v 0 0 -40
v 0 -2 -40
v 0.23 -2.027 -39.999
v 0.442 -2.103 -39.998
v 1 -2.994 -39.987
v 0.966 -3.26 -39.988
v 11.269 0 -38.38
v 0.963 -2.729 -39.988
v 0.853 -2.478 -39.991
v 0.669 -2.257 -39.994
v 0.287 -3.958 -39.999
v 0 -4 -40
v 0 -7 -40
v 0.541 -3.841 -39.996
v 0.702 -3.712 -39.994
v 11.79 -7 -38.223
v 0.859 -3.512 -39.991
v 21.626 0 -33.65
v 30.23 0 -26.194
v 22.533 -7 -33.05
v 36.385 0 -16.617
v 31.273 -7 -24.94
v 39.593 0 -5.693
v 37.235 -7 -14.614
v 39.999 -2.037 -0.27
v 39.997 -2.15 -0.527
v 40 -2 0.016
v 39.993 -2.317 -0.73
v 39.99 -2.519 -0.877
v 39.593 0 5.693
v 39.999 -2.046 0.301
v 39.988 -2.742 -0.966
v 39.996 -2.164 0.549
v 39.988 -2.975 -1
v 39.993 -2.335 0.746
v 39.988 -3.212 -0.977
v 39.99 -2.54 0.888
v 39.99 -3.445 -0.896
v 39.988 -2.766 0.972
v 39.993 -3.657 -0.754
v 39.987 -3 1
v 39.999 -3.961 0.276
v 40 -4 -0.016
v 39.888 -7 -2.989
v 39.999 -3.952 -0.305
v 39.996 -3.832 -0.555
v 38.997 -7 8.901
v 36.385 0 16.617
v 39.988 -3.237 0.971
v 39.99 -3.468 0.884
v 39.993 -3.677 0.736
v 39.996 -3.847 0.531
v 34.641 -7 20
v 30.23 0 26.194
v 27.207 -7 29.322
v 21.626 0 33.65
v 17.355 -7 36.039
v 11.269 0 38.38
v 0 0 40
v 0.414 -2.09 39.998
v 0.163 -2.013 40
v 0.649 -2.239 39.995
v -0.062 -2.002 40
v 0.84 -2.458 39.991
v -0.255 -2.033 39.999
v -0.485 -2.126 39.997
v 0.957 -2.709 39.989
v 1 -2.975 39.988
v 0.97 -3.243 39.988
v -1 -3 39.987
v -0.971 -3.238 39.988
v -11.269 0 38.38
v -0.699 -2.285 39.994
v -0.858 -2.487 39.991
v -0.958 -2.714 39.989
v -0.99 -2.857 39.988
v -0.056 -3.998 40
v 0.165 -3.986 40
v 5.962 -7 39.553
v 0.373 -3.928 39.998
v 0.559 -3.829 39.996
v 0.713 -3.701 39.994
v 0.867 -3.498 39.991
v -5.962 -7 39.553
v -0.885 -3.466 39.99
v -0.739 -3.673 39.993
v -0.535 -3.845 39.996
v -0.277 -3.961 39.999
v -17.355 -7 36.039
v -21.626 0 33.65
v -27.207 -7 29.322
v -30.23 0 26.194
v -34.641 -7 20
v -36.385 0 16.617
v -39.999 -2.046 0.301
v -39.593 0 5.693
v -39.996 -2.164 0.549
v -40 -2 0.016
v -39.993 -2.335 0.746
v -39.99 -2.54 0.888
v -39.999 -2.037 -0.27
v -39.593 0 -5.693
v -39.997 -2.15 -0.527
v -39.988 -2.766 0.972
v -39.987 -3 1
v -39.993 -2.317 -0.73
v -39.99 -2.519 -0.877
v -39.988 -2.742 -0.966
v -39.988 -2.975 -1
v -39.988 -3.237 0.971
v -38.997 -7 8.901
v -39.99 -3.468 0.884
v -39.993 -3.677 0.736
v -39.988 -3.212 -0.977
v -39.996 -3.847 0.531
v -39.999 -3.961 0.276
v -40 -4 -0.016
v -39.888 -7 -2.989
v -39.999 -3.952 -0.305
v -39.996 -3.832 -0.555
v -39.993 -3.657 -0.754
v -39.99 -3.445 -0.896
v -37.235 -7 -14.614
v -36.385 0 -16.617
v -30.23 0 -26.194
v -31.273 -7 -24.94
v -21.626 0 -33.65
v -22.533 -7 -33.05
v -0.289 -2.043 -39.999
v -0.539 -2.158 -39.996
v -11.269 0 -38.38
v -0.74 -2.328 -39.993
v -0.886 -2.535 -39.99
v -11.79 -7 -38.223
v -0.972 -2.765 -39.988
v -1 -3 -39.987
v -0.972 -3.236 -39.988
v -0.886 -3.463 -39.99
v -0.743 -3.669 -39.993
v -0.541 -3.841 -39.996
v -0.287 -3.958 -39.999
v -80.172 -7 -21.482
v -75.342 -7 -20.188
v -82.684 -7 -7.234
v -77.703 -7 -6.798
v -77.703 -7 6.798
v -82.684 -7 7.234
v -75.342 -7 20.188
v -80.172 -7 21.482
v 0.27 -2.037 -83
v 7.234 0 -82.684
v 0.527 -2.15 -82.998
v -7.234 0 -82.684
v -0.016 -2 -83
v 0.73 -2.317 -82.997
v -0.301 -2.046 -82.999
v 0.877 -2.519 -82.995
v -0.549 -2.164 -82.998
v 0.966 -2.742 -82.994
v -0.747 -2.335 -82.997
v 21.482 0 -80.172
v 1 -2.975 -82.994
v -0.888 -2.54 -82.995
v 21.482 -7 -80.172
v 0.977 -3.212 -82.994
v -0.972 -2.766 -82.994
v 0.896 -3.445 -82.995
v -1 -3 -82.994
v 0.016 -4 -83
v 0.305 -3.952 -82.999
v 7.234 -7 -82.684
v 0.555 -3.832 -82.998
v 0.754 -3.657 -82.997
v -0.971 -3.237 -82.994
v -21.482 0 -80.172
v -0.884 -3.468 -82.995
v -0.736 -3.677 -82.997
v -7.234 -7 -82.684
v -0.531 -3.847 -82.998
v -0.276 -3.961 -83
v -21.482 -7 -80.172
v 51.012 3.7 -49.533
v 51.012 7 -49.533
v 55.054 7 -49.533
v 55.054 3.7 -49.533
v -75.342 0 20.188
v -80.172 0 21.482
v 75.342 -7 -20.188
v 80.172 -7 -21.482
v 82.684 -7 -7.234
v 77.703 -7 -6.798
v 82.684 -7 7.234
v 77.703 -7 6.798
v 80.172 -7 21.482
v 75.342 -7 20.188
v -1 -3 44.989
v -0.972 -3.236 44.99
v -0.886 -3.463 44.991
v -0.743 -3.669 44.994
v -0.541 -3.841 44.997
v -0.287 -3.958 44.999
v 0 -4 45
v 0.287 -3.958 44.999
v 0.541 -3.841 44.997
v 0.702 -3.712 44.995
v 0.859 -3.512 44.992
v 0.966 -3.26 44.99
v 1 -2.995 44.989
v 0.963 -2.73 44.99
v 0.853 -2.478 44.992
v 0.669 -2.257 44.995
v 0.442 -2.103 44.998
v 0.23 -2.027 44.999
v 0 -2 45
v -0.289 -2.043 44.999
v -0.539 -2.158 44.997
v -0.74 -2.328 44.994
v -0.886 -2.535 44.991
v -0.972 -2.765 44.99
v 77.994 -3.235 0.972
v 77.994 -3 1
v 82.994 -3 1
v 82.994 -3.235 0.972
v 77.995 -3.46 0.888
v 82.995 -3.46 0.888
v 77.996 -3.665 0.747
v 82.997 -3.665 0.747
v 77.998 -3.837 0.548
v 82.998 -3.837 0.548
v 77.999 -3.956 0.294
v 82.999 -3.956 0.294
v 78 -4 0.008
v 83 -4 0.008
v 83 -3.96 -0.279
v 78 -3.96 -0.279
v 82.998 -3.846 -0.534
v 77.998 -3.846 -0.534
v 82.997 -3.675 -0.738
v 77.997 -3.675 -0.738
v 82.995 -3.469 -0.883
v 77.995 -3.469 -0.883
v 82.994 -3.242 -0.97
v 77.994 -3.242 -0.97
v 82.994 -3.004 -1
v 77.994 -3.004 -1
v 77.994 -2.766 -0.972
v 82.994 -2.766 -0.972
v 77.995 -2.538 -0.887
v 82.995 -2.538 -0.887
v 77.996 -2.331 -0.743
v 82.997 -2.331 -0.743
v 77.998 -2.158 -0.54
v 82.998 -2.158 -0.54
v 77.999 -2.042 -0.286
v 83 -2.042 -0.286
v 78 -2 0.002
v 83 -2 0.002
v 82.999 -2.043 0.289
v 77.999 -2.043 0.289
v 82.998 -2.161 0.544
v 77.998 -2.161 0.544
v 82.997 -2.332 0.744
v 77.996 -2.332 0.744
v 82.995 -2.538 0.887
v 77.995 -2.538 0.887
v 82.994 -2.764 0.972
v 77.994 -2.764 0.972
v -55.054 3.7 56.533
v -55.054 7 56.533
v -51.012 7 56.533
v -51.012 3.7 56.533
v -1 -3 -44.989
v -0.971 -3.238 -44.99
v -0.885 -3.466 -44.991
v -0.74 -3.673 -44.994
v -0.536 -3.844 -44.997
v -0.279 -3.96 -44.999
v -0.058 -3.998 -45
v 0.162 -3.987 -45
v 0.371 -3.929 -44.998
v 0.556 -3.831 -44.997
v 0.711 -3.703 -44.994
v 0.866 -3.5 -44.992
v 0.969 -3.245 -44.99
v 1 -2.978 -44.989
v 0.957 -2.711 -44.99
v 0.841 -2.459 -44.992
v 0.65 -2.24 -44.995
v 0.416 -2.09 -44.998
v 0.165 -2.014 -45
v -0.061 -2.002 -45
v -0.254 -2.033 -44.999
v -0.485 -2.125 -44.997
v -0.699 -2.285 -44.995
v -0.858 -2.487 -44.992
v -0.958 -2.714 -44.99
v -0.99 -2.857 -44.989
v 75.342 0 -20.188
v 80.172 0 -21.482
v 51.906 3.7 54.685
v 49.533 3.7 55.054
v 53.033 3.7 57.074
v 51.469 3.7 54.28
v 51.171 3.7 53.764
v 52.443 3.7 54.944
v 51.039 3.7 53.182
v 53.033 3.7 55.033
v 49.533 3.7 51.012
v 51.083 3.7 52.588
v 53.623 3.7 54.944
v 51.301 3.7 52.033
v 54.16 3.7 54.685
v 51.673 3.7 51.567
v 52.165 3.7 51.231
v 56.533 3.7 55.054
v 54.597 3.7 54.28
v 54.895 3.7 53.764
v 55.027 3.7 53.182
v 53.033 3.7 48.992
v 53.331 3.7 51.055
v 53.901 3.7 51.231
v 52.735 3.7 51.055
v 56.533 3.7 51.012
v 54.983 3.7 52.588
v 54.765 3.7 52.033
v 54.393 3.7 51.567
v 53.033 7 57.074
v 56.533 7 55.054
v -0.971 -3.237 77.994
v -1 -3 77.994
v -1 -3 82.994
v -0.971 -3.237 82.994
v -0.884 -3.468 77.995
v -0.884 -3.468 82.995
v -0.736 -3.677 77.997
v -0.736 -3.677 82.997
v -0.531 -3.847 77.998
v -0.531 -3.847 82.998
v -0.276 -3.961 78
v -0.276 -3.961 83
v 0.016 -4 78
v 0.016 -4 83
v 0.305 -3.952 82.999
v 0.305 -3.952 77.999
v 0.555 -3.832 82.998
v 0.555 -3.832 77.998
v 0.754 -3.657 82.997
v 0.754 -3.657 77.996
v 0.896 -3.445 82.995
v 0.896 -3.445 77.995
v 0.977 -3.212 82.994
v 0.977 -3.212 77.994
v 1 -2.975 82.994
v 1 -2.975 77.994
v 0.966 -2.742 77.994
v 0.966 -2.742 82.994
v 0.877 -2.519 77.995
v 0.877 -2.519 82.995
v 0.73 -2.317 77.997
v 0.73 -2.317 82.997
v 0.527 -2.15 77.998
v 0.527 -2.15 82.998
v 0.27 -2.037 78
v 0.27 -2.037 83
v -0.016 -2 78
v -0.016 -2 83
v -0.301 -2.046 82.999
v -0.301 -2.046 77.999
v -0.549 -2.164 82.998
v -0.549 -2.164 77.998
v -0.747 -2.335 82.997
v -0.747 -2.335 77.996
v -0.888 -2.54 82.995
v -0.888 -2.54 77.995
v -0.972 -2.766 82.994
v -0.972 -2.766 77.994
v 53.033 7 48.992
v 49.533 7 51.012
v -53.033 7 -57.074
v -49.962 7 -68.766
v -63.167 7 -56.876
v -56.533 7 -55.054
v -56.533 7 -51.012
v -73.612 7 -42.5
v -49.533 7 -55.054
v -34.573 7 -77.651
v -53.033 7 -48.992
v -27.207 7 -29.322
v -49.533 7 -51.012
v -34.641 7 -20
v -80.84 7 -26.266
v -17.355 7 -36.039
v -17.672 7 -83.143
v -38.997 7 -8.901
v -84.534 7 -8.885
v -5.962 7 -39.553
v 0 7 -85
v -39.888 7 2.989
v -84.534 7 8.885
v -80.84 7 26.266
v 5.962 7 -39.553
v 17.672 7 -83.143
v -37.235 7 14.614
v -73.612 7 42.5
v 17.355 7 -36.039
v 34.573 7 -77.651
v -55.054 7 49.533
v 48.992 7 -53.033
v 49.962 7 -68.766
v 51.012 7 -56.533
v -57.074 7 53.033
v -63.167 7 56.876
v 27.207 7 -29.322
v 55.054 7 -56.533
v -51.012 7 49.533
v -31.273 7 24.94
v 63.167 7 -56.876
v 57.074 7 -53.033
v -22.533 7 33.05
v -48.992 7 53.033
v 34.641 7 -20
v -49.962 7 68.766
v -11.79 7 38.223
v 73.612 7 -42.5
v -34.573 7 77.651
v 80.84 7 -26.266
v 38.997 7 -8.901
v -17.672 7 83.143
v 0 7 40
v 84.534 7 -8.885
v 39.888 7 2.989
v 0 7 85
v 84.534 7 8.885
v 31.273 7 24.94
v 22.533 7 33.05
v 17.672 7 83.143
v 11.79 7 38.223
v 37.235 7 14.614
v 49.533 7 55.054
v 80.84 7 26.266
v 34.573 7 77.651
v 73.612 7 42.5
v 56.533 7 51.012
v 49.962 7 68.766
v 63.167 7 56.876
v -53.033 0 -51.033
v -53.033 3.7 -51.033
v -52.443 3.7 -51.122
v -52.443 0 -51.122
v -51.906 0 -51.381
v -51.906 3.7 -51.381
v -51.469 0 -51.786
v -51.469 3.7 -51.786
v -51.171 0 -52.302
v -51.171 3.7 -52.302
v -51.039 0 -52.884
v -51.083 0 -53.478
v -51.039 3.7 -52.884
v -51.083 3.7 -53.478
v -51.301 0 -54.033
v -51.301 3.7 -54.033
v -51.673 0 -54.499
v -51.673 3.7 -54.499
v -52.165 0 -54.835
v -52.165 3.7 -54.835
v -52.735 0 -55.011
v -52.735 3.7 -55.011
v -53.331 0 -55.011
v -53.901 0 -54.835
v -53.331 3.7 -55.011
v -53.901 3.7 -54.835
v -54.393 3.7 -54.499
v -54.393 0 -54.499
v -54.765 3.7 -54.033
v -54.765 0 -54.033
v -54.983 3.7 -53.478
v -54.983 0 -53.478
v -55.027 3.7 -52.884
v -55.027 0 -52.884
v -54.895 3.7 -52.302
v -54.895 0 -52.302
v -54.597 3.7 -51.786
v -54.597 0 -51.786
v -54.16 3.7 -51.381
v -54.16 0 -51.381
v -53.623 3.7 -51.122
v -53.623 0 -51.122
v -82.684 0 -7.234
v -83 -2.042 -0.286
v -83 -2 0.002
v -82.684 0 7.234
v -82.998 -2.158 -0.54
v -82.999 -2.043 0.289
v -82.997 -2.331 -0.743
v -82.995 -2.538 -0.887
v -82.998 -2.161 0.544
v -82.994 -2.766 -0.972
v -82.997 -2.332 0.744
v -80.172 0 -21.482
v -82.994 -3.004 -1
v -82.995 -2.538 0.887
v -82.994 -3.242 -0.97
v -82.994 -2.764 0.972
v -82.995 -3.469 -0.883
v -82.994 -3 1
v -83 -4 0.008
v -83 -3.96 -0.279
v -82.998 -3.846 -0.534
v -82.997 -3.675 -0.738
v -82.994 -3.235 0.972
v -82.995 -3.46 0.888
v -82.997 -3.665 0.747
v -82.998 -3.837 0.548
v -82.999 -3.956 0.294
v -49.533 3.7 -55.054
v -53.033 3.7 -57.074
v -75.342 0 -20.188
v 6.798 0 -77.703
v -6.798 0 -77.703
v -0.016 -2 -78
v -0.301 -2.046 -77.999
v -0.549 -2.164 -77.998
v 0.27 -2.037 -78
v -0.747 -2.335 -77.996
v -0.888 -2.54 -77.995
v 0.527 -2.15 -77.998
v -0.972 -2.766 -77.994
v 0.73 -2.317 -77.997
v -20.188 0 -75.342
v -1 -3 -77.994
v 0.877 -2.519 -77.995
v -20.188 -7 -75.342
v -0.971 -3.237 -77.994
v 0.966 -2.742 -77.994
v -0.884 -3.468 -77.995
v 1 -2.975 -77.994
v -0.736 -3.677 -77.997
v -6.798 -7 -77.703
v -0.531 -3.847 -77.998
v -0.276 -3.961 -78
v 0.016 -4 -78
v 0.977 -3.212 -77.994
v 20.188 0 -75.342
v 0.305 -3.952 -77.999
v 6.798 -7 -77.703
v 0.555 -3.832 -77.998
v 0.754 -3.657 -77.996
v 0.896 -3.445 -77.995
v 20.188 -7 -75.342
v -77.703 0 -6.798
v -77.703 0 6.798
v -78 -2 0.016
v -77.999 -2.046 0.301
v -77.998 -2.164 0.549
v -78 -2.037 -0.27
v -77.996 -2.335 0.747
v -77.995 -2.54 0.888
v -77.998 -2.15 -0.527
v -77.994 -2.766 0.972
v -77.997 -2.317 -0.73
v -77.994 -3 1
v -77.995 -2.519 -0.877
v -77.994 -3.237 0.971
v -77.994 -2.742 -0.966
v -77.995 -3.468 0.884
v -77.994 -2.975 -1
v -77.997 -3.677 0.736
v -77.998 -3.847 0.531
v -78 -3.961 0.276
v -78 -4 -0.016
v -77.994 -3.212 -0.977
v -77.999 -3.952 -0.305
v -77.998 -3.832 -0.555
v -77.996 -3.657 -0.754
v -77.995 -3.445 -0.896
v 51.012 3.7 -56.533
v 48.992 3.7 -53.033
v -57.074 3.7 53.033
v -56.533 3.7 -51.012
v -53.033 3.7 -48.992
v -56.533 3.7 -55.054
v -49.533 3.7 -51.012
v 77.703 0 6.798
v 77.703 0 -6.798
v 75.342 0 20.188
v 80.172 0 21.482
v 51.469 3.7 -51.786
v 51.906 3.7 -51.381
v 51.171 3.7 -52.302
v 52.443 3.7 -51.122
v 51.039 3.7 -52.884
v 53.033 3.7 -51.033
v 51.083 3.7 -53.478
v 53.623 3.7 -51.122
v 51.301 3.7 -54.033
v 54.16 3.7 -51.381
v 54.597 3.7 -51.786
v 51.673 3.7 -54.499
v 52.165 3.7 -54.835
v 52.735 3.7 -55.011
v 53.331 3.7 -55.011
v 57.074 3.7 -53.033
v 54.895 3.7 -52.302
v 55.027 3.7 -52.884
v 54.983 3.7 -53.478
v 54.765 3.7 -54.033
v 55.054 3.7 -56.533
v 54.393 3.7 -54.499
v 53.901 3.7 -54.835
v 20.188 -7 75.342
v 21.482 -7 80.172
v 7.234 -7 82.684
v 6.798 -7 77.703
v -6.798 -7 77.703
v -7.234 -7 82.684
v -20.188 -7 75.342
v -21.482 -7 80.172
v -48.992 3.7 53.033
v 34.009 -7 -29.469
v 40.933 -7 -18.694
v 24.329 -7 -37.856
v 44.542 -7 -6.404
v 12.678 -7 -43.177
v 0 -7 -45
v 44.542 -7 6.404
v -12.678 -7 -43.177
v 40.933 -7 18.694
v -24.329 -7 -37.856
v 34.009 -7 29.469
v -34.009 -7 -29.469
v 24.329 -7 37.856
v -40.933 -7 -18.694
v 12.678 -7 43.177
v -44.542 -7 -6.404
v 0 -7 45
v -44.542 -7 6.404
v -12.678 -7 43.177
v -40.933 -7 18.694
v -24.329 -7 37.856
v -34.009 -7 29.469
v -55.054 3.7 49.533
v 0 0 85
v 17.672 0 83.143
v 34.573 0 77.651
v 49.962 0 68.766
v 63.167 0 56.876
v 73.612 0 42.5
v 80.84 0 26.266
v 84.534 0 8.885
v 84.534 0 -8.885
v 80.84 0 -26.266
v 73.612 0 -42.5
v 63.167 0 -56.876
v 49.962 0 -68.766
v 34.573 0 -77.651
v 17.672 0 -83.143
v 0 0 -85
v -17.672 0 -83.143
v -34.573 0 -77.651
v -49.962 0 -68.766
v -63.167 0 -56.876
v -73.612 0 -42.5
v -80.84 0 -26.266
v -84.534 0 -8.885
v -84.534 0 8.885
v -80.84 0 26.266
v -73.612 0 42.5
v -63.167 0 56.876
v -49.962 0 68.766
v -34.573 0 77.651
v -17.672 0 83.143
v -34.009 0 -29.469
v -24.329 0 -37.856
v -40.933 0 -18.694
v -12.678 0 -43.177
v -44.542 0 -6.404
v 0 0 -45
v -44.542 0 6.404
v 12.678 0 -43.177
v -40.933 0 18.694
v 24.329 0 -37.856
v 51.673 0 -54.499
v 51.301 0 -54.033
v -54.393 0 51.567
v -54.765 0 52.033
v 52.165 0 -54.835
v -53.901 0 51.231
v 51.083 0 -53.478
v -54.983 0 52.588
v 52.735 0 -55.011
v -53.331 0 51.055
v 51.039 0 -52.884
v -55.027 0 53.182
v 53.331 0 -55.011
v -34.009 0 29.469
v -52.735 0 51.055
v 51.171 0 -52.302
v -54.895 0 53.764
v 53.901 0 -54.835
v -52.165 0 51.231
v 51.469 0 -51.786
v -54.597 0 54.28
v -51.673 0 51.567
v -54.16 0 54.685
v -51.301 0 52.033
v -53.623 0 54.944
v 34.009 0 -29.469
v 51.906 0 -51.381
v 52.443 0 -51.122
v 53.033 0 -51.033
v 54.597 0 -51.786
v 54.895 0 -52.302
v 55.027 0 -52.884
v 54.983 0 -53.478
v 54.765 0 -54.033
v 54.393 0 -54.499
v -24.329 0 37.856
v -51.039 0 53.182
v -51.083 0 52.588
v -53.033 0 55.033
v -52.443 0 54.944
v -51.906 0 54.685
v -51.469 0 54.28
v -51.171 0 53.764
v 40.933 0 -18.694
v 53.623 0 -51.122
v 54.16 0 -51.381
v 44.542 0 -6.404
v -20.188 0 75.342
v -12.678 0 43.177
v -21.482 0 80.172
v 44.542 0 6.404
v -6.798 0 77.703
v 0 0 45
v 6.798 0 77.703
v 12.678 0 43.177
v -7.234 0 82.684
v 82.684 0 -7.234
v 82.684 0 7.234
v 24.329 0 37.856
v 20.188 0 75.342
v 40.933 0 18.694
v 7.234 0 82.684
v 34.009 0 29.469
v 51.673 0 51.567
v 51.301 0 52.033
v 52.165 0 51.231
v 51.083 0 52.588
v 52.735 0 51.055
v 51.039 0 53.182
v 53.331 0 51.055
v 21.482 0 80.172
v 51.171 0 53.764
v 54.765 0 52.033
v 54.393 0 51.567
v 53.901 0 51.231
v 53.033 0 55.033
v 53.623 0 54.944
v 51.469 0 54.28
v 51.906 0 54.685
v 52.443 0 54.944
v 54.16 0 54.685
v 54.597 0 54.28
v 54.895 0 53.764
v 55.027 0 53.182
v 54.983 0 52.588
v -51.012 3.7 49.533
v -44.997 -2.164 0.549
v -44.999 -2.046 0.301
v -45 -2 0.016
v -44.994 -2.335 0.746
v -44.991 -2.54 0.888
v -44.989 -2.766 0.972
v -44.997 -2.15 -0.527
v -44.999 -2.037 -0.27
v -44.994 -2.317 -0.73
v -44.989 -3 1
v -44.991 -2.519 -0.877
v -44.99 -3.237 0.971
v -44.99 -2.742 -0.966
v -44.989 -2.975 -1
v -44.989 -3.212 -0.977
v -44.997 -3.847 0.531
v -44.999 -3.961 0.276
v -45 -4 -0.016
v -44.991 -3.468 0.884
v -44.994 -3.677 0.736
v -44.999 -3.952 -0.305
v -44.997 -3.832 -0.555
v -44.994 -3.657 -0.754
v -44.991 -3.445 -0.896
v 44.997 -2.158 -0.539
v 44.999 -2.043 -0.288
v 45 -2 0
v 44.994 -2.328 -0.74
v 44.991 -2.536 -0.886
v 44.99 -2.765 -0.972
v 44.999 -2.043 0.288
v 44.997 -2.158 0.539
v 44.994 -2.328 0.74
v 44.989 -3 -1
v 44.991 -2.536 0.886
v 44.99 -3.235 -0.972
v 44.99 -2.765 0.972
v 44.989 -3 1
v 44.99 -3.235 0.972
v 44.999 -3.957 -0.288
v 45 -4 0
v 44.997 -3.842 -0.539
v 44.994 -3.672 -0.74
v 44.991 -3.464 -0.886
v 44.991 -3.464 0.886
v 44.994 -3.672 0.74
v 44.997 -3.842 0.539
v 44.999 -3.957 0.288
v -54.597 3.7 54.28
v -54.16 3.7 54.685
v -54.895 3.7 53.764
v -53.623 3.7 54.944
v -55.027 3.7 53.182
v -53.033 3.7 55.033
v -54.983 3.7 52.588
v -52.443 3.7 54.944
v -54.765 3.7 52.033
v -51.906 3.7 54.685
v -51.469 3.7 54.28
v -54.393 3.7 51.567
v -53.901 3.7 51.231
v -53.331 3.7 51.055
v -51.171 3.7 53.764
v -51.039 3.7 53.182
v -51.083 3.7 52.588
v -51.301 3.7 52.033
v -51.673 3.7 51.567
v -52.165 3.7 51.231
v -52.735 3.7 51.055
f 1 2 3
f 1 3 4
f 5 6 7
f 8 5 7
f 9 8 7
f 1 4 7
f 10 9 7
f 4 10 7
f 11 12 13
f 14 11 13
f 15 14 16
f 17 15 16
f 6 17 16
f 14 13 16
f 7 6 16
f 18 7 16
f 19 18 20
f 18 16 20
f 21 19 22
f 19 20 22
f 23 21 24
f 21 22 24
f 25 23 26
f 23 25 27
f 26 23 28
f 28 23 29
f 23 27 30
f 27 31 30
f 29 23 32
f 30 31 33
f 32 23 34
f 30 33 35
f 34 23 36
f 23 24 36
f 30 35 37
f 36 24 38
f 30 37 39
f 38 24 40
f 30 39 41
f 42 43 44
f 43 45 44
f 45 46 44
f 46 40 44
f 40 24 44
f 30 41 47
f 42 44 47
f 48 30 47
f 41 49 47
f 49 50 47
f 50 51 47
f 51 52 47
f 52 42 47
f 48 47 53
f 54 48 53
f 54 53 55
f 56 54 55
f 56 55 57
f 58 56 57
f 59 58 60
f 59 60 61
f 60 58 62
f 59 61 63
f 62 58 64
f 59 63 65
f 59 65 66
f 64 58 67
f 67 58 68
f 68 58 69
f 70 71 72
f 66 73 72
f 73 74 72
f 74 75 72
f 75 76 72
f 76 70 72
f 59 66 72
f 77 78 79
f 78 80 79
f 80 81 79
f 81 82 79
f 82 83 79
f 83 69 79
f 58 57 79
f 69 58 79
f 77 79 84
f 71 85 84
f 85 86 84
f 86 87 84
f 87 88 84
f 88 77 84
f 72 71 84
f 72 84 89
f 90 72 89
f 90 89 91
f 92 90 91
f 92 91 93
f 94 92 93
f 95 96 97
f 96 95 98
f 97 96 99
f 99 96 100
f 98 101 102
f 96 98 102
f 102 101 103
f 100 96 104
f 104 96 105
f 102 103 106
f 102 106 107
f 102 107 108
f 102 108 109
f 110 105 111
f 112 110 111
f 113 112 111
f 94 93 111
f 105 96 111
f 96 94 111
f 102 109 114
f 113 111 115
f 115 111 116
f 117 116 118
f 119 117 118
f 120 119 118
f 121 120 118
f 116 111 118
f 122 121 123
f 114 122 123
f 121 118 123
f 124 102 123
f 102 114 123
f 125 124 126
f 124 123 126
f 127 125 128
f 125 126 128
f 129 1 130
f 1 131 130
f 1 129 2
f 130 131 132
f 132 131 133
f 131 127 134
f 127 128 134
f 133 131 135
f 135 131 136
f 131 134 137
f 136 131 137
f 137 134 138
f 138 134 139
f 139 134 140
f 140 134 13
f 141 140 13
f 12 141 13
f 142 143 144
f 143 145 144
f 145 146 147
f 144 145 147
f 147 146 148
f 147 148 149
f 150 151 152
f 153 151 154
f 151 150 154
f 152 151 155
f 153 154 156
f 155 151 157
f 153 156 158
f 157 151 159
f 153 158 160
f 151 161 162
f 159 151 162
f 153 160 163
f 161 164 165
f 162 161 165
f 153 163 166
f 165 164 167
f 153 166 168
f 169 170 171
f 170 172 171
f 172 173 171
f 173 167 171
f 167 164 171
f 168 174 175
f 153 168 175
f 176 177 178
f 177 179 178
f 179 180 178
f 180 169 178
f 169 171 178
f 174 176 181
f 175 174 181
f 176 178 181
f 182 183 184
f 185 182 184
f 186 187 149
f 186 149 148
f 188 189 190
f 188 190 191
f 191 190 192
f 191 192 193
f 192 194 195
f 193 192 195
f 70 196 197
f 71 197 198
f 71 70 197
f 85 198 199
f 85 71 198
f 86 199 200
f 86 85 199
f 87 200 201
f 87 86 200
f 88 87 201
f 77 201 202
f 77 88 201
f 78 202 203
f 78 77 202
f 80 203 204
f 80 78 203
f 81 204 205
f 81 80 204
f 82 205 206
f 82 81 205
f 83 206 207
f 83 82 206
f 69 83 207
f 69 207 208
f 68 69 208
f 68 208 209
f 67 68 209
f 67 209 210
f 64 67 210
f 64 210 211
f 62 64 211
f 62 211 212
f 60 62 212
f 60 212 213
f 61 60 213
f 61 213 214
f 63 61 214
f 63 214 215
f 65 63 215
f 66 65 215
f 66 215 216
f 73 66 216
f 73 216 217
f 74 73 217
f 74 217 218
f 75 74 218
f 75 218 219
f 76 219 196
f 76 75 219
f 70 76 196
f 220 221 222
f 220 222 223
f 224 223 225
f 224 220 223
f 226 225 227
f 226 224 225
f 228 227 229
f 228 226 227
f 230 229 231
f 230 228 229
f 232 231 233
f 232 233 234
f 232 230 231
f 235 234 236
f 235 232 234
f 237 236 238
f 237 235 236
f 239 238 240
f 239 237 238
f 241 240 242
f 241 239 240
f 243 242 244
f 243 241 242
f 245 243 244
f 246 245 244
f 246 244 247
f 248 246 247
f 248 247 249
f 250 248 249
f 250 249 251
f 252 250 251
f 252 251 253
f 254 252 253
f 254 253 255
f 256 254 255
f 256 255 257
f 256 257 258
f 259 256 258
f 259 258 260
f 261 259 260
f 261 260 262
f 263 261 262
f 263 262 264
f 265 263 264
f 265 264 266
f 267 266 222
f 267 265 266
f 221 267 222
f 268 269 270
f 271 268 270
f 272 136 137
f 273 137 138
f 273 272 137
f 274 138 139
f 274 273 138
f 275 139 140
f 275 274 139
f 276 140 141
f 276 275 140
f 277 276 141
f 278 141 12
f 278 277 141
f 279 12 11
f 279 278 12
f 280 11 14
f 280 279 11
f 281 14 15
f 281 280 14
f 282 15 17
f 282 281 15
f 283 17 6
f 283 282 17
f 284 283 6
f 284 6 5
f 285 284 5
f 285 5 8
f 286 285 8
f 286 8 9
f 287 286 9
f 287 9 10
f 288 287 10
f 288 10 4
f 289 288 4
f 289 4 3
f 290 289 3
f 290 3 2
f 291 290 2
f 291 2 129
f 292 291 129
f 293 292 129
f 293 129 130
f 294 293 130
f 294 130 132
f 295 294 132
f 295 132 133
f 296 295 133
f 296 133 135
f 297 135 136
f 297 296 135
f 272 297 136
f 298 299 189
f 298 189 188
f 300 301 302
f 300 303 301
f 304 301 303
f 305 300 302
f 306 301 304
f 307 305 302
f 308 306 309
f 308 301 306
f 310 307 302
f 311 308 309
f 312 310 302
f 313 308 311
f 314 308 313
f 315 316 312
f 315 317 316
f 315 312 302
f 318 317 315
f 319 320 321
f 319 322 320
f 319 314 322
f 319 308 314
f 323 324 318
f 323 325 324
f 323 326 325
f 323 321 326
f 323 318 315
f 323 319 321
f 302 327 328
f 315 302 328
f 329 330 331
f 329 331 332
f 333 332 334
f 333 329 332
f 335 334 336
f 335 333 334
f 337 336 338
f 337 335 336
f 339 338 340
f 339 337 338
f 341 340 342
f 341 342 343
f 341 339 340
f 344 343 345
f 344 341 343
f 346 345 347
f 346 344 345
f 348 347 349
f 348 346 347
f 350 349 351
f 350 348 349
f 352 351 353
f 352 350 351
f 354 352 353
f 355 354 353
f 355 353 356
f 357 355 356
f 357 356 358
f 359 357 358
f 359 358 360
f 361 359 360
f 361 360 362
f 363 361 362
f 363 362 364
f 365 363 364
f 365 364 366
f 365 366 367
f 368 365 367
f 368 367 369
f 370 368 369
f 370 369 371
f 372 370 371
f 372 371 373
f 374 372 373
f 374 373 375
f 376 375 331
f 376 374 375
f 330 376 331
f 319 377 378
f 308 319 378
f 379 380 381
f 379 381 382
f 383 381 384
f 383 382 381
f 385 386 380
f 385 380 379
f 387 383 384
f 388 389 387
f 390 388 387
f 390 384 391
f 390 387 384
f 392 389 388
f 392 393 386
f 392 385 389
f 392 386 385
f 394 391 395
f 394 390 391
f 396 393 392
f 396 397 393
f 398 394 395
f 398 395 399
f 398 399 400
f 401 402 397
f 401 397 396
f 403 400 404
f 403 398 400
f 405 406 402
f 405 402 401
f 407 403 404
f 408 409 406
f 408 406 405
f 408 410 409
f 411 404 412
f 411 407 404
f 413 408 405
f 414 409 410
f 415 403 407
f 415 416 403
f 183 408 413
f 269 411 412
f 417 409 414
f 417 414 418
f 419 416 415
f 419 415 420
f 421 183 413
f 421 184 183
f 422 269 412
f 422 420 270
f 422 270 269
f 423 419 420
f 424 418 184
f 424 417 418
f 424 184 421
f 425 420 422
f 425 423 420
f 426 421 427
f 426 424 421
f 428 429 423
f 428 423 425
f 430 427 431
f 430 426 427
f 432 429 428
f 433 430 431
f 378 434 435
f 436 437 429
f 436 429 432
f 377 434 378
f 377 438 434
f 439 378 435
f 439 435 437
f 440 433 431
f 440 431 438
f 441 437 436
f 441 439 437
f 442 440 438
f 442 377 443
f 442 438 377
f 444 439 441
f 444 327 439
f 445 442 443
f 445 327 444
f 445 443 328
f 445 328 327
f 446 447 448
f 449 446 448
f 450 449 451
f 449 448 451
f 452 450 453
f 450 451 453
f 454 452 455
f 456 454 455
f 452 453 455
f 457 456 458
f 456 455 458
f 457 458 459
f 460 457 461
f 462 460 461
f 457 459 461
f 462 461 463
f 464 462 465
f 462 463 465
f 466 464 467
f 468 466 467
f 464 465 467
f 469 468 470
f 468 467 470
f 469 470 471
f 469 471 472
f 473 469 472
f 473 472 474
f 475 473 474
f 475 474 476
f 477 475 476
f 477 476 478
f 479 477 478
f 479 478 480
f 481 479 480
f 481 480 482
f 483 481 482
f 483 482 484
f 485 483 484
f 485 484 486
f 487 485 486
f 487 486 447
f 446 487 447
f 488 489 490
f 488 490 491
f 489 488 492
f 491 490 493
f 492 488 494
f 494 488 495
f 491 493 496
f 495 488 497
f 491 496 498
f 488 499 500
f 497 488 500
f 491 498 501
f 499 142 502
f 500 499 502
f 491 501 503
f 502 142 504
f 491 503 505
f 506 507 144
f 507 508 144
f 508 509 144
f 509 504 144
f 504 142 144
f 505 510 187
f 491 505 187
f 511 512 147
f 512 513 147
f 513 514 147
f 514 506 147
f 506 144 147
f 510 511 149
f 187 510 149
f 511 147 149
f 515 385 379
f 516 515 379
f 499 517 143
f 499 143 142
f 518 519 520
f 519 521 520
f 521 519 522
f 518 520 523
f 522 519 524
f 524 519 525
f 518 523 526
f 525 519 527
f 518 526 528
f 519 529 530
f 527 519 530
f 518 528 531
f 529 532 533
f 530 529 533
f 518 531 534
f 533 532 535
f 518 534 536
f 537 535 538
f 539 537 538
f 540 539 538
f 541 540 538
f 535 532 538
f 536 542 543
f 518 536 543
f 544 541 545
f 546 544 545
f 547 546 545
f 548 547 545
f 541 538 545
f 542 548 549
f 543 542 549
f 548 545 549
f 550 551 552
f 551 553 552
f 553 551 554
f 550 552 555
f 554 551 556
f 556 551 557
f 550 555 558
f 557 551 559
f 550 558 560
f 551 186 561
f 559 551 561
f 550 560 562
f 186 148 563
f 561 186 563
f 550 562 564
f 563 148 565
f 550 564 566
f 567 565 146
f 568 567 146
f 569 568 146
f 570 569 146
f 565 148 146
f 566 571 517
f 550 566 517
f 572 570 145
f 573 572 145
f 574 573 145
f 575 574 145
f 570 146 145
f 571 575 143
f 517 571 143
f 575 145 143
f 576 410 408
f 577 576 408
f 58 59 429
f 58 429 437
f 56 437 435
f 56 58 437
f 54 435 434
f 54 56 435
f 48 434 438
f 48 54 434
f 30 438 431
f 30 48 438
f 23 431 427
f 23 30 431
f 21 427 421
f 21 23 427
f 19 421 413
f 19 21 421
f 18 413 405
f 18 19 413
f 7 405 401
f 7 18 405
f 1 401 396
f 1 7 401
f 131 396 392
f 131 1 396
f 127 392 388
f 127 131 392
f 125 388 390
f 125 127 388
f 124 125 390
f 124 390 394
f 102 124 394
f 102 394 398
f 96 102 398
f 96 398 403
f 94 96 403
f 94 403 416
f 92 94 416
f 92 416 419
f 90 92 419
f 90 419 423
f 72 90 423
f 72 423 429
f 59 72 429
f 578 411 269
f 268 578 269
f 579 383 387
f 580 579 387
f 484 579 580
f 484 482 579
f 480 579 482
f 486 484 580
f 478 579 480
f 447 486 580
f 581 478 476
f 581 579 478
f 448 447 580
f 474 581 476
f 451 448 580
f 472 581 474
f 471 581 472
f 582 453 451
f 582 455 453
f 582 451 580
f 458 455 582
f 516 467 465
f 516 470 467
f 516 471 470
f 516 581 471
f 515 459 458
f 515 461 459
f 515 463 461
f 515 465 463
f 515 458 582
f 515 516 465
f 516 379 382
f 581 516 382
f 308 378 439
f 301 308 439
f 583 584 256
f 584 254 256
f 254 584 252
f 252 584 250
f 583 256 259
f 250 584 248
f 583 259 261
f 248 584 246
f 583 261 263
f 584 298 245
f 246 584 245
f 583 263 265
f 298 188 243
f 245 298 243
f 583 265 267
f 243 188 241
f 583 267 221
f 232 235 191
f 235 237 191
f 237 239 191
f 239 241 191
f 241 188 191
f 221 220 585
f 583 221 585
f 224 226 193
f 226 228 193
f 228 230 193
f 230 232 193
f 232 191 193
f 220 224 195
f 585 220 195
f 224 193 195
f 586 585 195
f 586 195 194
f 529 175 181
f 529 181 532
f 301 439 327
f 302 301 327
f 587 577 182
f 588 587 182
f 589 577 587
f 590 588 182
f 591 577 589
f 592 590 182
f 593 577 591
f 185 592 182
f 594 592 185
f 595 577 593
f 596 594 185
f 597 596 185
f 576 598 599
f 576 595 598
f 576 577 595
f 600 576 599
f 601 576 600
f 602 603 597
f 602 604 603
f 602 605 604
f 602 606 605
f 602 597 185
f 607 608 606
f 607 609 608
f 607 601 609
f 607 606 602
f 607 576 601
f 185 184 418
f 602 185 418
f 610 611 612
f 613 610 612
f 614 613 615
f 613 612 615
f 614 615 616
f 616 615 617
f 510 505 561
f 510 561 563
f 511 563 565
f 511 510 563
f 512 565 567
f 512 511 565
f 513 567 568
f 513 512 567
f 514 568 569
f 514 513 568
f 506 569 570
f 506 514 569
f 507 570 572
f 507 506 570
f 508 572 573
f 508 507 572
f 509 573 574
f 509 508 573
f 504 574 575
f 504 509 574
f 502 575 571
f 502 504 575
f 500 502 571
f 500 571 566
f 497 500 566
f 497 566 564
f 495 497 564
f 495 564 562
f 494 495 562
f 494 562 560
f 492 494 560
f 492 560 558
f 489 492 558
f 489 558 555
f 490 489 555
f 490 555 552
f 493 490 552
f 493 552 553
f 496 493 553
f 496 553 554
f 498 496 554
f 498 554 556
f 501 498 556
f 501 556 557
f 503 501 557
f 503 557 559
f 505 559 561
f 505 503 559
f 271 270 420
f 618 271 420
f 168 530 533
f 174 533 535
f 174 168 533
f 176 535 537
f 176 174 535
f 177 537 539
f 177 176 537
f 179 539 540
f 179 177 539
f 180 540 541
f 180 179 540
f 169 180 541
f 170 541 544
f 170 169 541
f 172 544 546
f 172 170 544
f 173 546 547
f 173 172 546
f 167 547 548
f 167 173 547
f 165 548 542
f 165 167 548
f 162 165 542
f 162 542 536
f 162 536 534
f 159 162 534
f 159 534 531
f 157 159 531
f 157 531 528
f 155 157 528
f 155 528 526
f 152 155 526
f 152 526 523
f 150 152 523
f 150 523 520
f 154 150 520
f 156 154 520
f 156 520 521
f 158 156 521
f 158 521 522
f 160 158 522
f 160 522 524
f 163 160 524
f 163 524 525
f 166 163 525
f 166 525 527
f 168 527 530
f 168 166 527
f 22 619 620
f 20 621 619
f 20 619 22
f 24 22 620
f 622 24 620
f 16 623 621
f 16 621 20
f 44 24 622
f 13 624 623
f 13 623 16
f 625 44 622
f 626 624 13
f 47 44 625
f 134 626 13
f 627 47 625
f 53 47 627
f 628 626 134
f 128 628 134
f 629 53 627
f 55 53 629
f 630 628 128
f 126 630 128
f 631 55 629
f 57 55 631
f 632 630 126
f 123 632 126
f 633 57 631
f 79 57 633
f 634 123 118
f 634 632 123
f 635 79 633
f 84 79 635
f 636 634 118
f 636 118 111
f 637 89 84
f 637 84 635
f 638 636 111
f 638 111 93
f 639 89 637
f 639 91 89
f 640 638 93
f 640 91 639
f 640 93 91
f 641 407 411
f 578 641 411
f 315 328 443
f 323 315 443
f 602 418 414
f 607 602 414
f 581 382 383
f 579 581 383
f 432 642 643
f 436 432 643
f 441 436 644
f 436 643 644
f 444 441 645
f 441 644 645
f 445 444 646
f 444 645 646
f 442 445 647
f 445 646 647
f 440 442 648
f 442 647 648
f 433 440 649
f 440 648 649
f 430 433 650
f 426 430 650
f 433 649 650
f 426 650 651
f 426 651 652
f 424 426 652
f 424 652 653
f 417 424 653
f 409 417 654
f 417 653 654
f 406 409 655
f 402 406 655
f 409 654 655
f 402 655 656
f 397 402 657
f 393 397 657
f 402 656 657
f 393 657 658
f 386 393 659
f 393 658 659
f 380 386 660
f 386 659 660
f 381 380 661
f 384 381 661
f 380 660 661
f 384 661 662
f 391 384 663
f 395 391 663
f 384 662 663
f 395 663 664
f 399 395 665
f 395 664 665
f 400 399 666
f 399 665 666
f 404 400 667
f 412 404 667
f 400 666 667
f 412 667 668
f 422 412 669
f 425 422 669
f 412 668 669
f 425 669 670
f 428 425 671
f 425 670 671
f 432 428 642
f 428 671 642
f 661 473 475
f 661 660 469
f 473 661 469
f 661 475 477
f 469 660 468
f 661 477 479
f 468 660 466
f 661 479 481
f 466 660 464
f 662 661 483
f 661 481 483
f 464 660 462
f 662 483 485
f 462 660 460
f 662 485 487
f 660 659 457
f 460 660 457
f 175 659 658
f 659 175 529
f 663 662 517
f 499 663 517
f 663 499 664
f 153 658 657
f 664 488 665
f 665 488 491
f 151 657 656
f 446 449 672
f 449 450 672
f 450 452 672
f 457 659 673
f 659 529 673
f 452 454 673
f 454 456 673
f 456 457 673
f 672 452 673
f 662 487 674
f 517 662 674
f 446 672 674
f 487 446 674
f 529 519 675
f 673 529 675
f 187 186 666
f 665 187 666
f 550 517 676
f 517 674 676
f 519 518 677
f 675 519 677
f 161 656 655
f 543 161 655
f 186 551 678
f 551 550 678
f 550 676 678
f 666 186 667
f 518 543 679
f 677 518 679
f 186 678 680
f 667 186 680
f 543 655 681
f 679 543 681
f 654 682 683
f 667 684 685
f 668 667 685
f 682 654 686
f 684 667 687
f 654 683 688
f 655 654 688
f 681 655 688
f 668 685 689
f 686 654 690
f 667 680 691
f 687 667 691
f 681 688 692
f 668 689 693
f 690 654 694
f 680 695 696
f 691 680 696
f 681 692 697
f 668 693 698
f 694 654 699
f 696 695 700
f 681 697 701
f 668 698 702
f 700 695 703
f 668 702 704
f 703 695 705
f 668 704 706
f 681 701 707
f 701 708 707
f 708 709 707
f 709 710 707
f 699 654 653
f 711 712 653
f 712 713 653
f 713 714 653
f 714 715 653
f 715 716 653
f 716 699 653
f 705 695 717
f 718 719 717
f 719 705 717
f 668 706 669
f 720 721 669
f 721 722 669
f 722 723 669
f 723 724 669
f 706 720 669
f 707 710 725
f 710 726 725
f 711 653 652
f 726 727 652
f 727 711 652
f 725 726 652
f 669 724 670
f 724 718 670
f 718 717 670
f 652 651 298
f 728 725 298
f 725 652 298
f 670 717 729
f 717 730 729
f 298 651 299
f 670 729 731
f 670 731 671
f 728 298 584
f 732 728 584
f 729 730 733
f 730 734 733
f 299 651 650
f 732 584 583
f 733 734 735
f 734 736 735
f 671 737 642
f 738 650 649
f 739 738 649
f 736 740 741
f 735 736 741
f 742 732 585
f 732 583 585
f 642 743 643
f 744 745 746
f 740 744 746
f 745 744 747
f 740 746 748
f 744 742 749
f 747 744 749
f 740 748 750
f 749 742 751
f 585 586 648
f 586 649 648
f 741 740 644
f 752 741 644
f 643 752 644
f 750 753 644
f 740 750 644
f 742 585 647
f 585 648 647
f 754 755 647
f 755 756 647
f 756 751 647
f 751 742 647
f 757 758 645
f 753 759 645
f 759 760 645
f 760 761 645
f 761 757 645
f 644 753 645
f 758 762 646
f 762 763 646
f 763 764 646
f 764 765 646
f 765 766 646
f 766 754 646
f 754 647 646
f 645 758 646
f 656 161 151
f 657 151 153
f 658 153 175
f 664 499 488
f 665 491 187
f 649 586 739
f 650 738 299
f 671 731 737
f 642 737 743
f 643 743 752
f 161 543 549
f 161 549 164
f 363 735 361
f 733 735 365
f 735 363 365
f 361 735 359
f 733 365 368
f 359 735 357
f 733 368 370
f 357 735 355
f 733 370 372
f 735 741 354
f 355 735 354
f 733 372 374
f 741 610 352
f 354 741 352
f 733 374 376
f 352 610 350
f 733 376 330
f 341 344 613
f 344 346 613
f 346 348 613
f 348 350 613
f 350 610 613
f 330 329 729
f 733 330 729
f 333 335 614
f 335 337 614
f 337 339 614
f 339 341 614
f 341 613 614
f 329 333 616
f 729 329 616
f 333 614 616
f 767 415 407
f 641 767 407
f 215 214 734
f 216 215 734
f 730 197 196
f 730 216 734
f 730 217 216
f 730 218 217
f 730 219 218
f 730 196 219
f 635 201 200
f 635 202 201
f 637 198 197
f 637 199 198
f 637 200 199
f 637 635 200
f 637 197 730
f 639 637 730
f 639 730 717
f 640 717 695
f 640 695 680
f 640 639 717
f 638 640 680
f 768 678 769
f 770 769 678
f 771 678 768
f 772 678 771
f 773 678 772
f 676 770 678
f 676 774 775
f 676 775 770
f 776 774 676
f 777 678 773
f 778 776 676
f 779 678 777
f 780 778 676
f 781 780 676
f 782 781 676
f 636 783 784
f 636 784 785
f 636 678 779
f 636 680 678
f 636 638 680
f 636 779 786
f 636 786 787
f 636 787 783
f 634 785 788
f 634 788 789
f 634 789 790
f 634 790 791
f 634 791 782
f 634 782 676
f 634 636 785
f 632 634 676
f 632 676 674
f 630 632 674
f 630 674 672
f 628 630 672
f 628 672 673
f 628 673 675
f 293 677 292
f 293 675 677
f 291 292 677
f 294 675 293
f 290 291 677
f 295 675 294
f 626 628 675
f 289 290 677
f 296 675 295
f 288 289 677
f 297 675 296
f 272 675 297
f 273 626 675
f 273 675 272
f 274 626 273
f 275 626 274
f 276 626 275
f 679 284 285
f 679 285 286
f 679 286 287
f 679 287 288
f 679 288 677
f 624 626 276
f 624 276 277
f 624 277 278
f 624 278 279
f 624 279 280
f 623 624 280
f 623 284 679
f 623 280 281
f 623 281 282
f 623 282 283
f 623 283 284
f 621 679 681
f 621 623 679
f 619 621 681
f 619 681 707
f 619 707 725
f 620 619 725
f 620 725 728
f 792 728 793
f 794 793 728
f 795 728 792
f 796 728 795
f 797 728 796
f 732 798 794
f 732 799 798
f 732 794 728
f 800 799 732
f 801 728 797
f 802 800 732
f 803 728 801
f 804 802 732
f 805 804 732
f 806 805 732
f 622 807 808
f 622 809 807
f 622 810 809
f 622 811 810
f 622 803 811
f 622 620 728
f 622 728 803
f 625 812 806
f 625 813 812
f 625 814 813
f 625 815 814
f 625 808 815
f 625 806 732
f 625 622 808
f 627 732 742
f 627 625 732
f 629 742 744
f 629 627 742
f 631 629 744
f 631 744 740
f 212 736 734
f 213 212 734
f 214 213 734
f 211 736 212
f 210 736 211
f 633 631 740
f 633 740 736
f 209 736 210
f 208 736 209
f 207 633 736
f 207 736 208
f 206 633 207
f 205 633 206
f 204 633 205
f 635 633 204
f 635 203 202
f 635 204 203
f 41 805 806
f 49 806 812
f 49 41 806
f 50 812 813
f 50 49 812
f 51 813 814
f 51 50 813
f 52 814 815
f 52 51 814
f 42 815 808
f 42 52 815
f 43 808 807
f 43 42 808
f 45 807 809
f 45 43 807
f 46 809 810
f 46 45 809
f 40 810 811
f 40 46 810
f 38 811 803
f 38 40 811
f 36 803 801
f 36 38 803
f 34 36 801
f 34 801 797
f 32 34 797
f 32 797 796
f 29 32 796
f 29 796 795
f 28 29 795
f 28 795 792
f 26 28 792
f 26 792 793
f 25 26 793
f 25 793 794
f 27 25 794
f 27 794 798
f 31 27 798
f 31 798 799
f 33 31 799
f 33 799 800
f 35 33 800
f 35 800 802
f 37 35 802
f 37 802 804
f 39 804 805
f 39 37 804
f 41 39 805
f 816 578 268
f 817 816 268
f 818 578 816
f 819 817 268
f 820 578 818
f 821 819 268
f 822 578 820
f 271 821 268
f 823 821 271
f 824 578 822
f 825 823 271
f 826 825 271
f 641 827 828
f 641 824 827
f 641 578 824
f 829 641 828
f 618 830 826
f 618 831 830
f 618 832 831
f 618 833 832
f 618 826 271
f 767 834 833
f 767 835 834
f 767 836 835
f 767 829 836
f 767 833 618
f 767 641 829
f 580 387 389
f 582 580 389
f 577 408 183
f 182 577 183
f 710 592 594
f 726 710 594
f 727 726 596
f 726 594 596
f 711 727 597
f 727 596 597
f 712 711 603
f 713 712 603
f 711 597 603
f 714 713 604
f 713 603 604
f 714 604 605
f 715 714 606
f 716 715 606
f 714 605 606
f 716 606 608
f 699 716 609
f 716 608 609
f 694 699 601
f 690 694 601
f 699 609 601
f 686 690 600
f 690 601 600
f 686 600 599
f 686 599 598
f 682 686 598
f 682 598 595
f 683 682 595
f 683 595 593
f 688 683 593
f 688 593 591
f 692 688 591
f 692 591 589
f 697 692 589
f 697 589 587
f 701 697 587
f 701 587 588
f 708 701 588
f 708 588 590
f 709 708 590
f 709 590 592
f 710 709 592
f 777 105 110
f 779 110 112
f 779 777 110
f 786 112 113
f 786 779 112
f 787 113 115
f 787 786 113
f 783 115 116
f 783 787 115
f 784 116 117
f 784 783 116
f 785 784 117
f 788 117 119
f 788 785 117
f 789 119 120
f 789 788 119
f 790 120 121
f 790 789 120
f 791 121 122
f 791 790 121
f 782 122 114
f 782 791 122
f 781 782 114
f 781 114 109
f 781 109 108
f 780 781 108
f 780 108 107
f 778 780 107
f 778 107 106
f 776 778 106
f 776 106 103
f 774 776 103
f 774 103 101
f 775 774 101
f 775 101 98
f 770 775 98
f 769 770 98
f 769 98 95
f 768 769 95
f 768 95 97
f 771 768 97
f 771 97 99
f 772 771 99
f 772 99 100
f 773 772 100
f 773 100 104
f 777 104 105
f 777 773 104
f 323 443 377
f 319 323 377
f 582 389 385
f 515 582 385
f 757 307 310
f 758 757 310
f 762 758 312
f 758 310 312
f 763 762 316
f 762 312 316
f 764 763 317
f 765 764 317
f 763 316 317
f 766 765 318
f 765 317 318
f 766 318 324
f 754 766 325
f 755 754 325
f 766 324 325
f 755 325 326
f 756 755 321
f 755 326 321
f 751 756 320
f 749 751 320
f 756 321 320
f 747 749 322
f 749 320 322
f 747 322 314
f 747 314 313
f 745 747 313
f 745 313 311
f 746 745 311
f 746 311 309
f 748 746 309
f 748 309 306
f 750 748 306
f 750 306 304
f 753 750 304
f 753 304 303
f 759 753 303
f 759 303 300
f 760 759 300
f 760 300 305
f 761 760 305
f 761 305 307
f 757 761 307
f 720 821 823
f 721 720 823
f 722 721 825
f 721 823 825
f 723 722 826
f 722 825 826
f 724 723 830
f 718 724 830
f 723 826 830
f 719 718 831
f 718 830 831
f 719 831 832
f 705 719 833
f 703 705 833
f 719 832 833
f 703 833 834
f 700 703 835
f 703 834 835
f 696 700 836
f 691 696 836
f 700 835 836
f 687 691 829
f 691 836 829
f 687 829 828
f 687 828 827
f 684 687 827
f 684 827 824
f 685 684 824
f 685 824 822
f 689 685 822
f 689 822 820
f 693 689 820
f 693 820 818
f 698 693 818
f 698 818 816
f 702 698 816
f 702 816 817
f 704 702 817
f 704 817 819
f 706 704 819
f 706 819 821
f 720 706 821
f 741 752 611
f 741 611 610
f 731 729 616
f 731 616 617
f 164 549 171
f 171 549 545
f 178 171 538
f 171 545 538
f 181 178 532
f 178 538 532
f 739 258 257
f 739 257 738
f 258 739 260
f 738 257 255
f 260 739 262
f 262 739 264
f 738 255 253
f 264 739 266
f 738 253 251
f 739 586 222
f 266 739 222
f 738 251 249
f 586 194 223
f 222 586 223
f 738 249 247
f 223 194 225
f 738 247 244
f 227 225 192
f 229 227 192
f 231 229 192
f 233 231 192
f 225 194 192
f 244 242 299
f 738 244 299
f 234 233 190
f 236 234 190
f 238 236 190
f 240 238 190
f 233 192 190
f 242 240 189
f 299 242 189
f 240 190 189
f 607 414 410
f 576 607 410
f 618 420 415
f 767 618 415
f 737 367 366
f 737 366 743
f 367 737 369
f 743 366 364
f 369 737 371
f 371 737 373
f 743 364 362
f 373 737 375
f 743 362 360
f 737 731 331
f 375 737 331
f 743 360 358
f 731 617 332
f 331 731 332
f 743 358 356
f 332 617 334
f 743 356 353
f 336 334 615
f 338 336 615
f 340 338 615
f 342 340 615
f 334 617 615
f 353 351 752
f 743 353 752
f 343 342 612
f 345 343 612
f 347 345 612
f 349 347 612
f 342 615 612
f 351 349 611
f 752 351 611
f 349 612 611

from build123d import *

# Parameters (mm, degrees)
SKETCH1_R           = 85
SKETCH1_R_2         = 40
BOSS_EXTRUDE1_DEPTH = 7
BOSS_EXTRUDE2_START = 7
SKETCH11_R          = 45
SKETCH11_R_2        = 40
BOSS_EXTRUDE2_DEPTH = 7
CUT_EXTRUDE1_START  = -133
SKETCH13_R          = 1
CUT_EXTRUDE1_DEPTH  = 243
SKETCH14_R          = 2
CUT_EXTRUDE2_DEPTH  = 133
CUT_EXTRUDE3_DEPTH  = 3.3
CIRPATTERN1_COUNT   = 2
CIRPATTERN1_ANGLE   = 90


with BuildPart() as part:
    # Sketch1 → Boss-Extrude1 (new body)
    with BuildSketch(Plane(origin=(0, 0, 0), x_dir=(1, 0, 0), z_dir=(0, 1, 0))):
        Circle(SKETCH1_R)
        Circle(SKETCH1_R_2, mode=Mode.SUBTRACT)
    extrude(amount=BOSS_EXTRUDE1_DEPTH)

    # Sketch11 → Boss-Extrude2 (add)
    # profile 1 of 5: a face of its own
    with BuildSketch(Plane.XZ.offset(BOSS_EXTRUDE2_START)):
        Circle(SKETCH11_R)
        Circle(SKETCH11_R_2, mode=Mode.SUBTRACT)
    # profile 2 of 5: a face of its own
    with BuildSketch(Plane.XZ.offset(BOSS_EXTRUDE2_START)):
        with BuildLine():
            Line((75.342214451, 20.187885518), (80.171843582, 21.481980744))
            ThreePointArc((80.171843582, 21.481980744), (83, 0), (80.171843582, -21.481980744))
            Line((80.171843582, -21.481980744), (75.342214451, -20.187885518))
            ThreePointArc((75.342214451, -20.187885518), (78, 0), (75.342214451, 20.187885518))
        make_face()
    # profile 3 of 5: a face of its own
    with BuildSketch(Plane.XZ.offset(BOSS_EXTRUDE2_START)):
        with BuildLine():
            Line((20.187885518, -75.342214451), (21.481980744, -80.171843582))
            ThreePointArc((21.481980744, -80.171843582), (0, -83), (-21.481980744, -80.171843582))
            Line((-21.481980744, -80.171843582), (-20.187885518, -75.342214451))
            ThreePointArc((-20.187885518, -75.342214451), (0, -78), (20.187885518, -75.342214451))
        make_face()
    # profile 4 of 5: a face of its own
    with BuildSketch(Plane.XZ.offset(BOSS_EXTRUDE2_START)):
        with BuildLine():
            Line((-75.342214451, -20.187885518), (-80.171843582, -21.481980744))
            ThreePointArc((-80.171843582, -21.481980744), (-83, 0), (-80.171843582, 21.481980744))
            Line((-80.171843582, 21.481980744), (-75.342214451, 20.187885518))
            ThreePointArc((-75.342214451, 20.187885518), (-78, 0), (-75.342214451, -20.187885518))
        make_face()
    # profile 5 of 5: a face of its own
    with BuildSketch(Plane.XZ.offset(BOSS_EXTRUDE2_START)):
        with BuildLine():
            Line((-20.187885518, 75.342214451), (-21.481980744, 80.171843582))
            ThreePointArc((-21.481980744, 80.171843582), (0, 83), (21.481980744, 80.171843582))
            Line((21.481980744, 80.171843582), (20.187885518, 75.342214451))
            ThreePointArc((20.187885518, 75.342214451), (0, 78), (-20.187885518, 75.342214451))
        make_face()
    extrude(amount=-BOSS_EXTRUDE2_DEPTH)

    # Sketch13 → Cut-Extrude1 (cut)
    with BuildSketch(Plane(origin=(0, 0, 0), x_dir=(0, 0, -1), z_dir=(1, 0, 0)).offset(CUT_EXTRUDE1_START)):
        with Locations((0, -3)):
            Circle(SKETCH13_R)
    cut_extrude1 = extrude(amount=CUT_EXTRUDE1_DEPTH, mode=Mode.SUBTRACT)

    # Sketch14 → Cut-Extrude2 (cut)
    with BuildSketch(Plane(origin=(0, 7, 0), x_dir=(1, 0, 0), z_dir=(0, 1, 0))):
        with Locations((-53.033008589, 53.033008589)):
            Circle(SKETCH14_R)
        with Locations((53.033008589, 53.033008589)):
            Circle(SKETCH14_R)
        with Locations((53.033008589, -53.033008589)):
            Circle(SKETCH14_R)
        with Locations((-53.033008589, -53.033008589)):
            Circle(SKETCH14_R)
    extrude(amount=-CUT_EXTRUDE2_DEPTH, mode=Mode.SUBTRACT)

    # Sketch15 → Cut-Extrude3 (cut)
    with BuildSketch(Plane(origin=(0, 7, 0), x_dir=(1, 0, 0), z_dir=(0, 1, 0))):
        Polygon((-49.533008589, 55.053734531), (-53.033008589, 57.074460473), (-56.533008589, 55.053734531), (-56.533008589, 51.012282647), (-53.033008589, 48.991556705), (-49.533008589, 51.012282647), align=None)
        Polygon((55.053734531, 49.533008589), (57.074460473, 53.033008589), (55.053734531, 56.533008589), (51.012282647, 56.533008589), (48.991556705, 53.033008589), (51.012282647, 49.533008589), align=None)
        Polygon((49.533008589, -55.053734531), (53.033008589, -57.074460473), (56.533008589, -55.053734531), (56.533008589, -51.012282647), (53.033008589, -48.991556705), (49.533008589, -51.012282647), align=None)
        Polygon((-55.053734531, -49.533008589), (-57.074460473, -53.033008589), (-55.053734531, -56.533008589), (-51.012282647, -56.533008589), (-48.991556705, -53.033008589), (-51.012282647, -49.533008589), align=None)
    extrude(amount=-CUT_EXTRUDE3_DEPTH, mode=Mode.SUBTRACT)

    # CirPattern1: Cut-Extrude1 ×2 about axis
    cirpattern1_axis = Axis((0, 7, 0), (0, 1, 0))
    for i in range(1, CIRPATTERN1_COUNT):
        add(cut_extrude1.rotate(cirpattern1_axis, i * CIRPATTERN1_ANGLE / (CIRPATTERN1_COUNT - 1)), mode=Mode.SUBTRACT)


solid = part.part
